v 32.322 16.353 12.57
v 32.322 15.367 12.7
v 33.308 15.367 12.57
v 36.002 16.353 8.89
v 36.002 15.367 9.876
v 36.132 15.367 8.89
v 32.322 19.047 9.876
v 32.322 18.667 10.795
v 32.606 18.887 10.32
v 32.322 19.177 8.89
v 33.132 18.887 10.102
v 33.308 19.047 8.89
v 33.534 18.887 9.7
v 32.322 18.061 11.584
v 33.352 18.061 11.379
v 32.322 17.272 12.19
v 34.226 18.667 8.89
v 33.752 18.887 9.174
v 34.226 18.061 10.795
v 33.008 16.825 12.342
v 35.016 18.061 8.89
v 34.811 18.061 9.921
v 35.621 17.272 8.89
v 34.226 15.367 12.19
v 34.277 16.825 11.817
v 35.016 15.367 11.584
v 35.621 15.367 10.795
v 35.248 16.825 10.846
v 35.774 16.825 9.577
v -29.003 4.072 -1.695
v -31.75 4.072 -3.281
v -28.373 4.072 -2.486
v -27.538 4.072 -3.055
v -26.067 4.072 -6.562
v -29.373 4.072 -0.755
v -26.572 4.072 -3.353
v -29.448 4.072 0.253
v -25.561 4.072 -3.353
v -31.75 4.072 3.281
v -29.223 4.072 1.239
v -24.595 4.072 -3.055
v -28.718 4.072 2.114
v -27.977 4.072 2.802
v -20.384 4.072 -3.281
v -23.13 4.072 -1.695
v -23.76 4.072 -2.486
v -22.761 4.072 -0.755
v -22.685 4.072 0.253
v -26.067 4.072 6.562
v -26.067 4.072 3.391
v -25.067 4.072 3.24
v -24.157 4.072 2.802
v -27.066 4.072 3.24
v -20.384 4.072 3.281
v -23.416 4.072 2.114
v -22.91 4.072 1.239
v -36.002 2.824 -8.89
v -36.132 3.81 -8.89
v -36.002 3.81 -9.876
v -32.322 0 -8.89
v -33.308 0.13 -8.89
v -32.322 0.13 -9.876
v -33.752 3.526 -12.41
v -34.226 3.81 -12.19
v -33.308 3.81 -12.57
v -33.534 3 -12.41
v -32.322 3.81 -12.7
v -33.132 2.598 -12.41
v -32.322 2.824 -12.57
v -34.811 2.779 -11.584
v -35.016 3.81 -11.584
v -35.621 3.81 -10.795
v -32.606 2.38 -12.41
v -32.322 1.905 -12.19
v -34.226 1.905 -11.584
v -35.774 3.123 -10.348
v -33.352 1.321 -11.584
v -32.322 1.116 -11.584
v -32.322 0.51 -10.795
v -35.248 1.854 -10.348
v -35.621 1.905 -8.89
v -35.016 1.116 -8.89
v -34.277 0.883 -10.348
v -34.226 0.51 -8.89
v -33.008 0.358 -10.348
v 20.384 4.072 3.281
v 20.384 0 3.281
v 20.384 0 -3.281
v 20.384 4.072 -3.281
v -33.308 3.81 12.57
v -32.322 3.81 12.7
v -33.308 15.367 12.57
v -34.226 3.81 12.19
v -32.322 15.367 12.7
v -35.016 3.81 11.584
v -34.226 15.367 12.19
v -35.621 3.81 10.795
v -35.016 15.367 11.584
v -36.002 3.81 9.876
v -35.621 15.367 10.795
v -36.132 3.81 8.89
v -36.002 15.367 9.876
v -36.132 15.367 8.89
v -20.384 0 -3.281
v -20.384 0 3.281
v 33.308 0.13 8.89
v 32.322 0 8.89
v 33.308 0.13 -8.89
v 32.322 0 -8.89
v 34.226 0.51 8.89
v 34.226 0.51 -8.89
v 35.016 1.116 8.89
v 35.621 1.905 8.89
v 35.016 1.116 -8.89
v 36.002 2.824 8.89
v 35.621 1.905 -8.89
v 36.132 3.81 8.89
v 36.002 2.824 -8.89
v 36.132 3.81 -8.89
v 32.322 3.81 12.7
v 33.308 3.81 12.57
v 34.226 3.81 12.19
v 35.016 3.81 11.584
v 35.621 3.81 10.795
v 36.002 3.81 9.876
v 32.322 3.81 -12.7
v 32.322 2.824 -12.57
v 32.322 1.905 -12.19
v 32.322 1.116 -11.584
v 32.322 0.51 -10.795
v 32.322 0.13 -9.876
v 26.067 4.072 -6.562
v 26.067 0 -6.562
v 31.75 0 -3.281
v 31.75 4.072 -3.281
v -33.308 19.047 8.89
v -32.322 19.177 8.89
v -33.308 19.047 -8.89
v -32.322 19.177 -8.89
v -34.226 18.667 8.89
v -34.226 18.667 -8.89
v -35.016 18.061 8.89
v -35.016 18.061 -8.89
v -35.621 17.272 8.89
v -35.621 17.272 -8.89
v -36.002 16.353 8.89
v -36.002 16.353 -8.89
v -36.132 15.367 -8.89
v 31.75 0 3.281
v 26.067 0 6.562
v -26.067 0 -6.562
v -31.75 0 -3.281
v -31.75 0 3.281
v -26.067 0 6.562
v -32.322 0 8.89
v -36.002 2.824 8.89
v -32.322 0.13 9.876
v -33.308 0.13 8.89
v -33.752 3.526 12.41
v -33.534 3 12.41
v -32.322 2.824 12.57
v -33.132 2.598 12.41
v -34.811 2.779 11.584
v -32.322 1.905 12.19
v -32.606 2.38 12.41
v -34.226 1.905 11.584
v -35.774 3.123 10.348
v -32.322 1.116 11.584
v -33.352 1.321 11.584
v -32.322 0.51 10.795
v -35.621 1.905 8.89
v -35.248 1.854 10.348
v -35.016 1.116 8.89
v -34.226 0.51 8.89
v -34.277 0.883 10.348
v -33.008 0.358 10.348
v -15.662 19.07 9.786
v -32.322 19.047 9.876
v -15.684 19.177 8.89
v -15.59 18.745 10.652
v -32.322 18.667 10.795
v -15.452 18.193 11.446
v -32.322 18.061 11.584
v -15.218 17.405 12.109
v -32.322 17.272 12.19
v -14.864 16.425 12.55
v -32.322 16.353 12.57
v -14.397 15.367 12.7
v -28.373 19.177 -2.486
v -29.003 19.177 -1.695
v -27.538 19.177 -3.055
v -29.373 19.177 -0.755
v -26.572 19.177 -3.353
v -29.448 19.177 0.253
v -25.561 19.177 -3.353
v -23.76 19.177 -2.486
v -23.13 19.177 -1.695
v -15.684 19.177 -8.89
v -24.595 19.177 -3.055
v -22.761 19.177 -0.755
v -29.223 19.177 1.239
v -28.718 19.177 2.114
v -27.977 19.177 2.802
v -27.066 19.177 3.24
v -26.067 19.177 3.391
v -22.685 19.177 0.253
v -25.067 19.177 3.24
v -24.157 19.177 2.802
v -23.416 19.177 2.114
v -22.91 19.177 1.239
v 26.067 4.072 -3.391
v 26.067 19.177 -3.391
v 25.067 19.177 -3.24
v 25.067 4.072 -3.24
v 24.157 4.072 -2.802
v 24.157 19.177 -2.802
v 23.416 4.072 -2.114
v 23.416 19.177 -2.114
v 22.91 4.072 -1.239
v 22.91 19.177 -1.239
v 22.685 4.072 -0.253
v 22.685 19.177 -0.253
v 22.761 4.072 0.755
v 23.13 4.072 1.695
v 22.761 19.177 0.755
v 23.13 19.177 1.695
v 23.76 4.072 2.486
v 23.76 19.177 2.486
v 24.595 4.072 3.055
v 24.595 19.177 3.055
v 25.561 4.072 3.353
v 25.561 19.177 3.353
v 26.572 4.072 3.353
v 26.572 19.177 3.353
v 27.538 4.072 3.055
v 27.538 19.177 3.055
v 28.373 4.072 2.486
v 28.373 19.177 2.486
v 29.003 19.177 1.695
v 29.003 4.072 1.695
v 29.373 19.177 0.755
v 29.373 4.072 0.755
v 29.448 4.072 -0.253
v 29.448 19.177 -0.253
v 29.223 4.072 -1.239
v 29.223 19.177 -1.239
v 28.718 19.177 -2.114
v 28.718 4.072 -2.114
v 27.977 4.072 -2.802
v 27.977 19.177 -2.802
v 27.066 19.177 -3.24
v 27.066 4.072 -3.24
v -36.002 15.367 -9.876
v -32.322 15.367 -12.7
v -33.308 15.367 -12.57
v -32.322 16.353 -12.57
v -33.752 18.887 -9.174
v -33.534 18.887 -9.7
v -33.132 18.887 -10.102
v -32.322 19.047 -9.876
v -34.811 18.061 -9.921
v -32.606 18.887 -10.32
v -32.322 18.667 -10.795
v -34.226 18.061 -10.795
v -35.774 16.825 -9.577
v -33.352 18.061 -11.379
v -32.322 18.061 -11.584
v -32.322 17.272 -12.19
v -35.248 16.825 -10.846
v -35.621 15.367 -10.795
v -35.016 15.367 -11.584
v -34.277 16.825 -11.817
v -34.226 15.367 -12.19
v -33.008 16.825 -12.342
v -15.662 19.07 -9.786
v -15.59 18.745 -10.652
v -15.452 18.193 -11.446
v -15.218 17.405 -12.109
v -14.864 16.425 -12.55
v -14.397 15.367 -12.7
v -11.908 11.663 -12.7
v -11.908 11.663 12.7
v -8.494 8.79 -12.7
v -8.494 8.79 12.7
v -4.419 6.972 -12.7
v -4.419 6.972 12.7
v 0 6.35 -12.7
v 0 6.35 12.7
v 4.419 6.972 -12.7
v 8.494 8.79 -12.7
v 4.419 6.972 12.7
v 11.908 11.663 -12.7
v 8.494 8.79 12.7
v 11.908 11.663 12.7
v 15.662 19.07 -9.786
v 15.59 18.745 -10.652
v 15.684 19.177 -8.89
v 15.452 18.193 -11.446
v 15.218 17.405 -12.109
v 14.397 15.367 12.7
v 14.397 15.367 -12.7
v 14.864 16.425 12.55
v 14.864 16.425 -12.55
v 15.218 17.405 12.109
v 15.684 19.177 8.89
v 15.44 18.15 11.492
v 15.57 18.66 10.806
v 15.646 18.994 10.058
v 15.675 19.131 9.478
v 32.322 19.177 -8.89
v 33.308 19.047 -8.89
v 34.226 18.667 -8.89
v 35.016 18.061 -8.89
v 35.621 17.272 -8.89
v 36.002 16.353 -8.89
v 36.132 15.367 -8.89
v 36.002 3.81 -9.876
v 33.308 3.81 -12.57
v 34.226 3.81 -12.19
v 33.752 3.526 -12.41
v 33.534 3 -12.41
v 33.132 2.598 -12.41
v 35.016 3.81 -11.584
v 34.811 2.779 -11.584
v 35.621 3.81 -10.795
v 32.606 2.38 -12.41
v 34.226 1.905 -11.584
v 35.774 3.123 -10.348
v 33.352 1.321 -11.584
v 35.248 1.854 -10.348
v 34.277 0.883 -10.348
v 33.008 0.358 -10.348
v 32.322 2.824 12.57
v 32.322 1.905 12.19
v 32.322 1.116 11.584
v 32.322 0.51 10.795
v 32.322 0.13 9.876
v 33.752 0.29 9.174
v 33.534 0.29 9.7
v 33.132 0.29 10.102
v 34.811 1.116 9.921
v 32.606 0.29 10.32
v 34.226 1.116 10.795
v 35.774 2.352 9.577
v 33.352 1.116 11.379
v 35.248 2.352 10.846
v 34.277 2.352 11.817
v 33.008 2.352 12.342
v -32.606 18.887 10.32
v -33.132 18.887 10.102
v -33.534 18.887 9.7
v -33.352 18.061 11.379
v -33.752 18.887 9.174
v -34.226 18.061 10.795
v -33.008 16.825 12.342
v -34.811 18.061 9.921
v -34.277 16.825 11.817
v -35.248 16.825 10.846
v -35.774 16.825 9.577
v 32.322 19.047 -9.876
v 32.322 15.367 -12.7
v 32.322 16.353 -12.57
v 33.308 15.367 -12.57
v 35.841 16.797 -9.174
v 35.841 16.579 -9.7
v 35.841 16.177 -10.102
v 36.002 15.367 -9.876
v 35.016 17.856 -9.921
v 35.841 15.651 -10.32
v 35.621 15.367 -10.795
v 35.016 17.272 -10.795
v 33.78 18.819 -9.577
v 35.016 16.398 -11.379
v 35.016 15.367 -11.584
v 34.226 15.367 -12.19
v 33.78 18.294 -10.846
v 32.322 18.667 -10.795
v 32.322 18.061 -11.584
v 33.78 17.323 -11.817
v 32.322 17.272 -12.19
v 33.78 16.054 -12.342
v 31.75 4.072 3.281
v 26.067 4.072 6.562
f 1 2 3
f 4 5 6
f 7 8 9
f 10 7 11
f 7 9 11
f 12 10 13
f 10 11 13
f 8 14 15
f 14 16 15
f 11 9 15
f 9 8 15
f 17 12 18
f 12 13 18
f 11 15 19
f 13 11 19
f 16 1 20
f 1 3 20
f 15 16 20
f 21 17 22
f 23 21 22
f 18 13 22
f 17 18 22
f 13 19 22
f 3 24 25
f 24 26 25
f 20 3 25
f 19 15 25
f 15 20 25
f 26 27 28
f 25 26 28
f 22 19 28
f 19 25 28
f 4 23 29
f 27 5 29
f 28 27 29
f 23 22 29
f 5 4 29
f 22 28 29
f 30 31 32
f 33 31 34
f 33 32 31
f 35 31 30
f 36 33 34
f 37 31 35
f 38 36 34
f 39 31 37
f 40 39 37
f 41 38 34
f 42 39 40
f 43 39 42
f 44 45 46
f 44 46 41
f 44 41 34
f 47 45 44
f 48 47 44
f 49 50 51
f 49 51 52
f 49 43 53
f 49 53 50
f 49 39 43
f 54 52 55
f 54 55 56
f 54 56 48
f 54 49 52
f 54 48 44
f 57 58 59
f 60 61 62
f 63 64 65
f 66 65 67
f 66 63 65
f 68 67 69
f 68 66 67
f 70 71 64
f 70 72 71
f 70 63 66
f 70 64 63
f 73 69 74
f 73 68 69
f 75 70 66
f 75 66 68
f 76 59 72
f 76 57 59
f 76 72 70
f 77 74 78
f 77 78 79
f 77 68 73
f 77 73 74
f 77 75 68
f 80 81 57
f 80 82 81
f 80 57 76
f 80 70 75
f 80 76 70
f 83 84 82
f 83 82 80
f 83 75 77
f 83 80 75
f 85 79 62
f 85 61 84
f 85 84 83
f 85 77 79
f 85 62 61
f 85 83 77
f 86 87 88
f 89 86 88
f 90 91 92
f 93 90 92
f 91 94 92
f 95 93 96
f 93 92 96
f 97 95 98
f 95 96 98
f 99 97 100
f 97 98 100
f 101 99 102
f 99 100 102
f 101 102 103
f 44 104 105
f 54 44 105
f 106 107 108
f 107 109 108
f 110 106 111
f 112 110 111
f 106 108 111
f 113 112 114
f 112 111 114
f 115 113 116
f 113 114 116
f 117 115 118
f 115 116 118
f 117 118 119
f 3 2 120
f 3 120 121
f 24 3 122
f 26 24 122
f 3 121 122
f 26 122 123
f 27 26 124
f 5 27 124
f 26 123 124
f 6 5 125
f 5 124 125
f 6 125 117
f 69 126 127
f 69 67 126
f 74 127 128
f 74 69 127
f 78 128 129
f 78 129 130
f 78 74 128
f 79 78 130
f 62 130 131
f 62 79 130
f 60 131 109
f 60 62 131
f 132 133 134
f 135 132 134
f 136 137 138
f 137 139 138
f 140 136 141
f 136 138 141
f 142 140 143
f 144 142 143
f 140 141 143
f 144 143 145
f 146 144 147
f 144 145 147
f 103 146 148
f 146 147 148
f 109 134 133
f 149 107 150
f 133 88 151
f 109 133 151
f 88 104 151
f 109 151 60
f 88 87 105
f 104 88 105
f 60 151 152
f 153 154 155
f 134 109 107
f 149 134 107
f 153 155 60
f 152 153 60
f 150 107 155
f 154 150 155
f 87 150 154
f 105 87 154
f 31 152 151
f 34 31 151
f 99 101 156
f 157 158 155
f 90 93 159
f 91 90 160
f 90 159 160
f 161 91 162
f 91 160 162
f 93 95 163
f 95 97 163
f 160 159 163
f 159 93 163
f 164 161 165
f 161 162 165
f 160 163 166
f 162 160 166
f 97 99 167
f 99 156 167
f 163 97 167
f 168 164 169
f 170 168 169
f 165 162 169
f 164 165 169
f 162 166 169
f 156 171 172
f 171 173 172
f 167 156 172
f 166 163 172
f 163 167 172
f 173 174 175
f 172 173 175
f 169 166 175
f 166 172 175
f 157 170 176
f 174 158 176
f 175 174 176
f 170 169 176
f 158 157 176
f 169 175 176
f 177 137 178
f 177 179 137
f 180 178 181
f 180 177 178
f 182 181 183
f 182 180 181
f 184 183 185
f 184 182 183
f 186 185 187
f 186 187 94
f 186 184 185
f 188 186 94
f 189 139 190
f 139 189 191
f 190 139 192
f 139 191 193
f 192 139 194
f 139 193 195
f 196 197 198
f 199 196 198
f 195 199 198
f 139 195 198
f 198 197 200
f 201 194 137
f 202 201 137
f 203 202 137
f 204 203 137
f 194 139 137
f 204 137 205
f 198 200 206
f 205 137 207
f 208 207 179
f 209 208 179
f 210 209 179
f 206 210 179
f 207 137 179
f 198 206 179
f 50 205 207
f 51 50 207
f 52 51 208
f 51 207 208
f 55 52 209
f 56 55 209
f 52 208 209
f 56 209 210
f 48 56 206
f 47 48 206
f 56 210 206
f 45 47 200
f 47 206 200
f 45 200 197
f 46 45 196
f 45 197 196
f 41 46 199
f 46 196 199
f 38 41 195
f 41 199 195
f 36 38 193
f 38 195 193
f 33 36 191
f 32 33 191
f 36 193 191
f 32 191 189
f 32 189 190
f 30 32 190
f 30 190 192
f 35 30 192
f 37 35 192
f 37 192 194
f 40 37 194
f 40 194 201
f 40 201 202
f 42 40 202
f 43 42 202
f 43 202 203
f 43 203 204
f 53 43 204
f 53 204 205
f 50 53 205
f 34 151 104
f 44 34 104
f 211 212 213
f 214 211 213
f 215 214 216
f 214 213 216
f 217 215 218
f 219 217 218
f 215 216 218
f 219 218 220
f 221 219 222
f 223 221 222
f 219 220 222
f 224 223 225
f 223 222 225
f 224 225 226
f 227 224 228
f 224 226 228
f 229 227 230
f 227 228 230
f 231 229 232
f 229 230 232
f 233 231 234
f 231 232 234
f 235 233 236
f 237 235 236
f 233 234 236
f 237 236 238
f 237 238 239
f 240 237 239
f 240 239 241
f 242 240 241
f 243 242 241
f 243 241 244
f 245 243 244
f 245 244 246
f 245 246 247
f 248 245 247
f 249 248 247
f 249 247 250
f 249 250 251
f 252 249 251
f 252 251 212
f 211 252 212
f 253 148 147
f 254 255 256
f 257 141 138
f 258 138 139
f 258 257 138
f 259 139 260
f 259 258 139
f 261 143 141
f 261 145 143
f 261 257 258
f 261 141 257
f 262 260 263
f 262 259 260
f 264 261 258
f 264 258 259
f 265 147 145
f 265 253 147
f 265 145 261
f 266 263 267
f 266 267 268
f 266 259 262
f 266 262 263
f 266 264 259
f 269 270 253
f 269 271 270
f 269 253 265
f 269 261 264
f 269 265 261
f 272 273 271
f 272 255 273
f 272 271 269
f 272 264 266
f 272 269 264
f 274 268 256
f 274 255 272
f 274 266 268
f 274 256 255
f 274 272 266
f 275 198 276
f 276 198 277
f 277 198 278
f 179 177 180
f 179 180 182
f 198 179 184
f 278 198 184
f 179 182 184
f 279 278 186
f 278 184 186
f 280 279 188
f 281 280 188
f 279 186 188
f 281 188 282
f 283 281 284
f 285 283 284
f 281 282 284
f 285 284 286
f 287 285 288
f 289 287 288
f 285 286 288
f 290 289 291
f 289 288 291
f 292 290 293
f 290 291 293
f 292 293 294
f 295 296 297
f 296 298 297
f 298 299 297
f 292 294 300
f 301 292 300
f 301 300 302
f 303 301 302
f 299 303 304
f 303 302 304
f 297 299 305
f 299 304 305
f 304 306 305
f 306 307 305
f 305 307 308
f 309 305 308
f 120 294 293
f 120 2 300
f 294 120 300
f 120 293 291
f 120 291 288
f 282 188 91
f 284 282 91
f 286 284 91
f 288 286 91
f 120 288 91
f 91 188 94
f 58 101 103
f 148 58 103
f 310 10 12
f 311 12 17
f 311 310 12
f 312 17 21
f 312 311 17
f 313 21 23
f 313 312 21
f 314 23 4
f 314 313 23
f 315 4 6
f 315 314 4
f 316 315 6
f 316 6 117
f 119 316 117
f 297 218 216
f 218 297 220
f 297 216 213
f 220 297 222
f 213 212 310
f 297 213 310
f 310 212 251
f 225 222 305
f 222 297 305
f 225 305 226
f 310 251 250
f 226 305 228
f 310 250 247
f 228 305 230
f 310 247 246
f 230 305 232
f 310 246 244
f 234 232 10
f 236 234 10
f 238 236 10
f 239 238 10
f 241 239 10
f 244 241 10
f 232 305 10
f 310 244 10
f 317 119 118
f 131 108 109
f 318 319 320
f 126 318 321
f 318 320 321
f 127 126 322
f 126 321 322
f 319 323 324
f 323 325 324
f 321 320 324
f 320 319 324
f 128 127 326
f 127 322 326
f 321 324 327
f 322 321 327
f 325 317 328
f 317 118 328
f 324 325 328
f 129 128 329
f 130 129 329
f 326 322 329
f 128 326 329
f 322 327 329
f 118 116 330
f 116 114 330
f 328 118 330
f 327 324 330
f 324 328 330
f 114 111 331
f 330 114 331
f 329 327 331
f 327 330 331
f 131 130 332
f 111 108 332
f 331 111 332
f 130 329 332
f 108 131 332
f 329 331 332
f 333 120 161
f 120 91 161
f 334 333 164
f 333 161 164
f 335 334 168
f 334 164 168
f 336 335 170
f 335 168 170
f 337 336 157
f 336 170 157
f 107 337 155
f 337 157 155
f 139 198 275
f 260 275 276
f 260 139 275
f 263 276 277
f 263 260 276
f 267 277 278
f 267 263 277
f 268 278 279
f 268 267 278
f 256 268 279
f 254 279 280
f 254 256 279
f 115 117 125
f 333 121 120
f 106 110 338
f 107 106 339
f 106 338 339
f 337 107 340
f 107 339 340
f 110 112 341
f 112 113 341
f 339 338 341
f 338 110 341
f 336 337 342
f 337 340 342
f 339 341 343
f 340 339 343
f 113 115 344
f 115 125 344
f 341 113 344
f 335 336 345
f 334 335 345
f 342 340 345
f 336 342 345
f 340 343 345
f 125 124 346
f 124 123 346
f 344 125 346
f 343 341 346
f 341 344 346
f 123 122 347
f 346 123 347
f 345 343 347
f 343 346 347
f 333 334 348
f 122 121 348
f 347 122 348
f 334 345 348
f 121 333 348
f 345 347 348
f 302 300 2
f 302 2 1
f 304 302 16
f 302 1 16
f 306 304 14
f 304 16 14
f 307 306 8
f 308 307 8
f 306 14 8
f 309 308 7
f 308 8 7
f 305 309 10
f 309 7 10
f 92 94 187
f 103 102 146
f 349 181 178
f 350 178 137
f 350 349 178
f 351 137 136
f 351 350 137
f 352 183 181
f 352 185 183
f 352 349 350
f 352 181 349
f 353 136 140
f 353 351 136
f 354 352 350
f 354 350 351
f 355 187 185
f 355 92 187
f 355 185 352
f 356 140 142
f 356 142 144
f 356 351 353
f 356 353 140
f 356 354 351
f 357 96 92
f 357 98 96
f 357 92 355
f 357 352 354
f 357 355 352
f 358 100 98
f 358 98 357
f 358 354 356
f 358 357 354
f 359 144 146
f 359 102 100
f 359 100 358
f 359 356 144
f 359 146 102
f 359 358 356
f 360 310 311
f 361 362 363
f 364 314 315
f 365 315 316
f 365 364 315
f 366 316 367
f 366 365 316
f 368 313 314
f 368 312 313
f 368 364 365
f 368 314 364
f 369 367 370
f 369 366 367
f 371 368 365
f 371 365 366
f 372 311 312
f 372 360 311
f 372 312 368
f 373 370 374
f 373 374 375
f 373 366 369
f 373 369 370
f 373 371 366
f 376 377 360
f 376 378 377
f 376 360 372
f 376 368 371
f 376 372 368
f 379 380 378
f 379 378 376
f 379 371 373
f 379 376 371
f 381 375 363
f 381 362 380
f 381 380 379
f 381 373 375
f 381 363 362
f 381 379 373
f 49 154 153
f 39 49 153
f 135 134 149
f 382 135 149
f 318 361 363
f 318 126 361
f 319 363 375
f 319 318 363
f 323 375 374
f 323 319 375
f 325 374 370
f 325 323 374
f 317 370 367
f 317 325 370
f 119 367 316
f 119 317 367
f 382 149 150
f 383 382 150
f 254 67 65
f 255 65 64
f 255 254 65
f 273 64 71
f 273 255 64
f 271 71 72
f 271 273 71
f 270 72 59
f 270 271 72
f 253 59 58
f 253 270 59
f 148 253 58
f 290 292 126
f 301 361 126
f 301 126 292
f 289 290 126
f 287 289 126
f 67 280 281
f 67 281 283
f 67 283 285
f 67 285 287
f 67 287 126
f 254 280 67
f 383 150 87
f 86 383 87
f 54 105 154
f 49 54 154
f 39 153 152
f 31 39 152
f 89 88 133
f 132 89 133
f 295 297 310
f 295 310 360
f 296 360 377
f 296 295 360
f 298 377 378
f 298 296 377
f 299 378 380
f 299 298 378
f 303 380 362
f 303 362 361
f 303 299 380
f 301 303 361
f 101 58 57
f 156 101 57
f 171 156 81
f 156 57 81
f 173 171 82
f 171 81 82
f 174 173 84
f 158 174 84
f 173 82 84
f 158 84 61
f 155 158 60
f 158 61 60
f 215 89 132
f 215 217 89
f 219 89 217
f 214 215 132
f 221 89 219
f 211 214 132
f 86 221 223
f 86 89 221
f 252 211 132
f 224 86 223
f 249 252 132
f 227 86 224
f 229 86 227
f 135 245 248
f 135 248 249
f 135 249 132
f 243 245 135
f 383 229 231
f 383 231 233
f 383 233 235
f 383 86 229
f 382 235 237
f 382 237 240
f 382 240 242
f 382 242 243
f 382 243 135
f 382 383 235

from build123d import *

# Parameters (mm, degrees)
BOSS_EXTRUDE1_DEPTH = 12.7
SKETCH2_R           = 3.3909
CUT_EXTRUDE1_DEPTH  = 45.343964598
SKETCH3_W           = 72.263
SKETCH3_H           = 7.175826556
CUT_EXTRUDE2_DEPTH  = 50.500072689
CUT_EXTRUDE3_DEPTH  = 4.07162
FILLET3_R           = 3.81


with BuildPart() as part:
    # Sketch1 → Boss-Extrude1 (new, symmetric)
    with BuildSketch(Plane.XY):
        with BuildLine():
            Line((16.002, 22.352), (36.1315, 22.352))
            Line((36.1315, 22.352), (36.1315, 0))
            Line((36.1315, 0), (-36.1315, 0))
            Line((-36.1315, 0), (-36.1315, 22.352))
            Line((-36.1315, 22.352), (-16.002, 22.352))
            ThreePointArc((-16.002, 22.352), (0, 6.35), (16.002, 22.352))
        make_face()
    extrude(amount=BOSS_EXTRUDE1_DEPTH, both=True)

    # Sketch2 → Cut-Extrude1 (cut, through all)
    with BuildSketch(Plane(origin=(0, 22.352, 0), x_dir=(1, 0, 0), z_dir=(0, 1, 0))):
        with Locations(Location((-26.06675, 0, 0), (0, 0, 270))):
            Circle(SKETCH2_R)
        with Locations(Location((26.06675, 0, 0), (0, 0, 90))):
            Circle(SKETCH2_R)
    extrude(amount=-CUT_EXTRUDE1_DEPTH, mode=Mode.SUBTRACT)

    # Sketch3 → Cut-Extrude2 (cut, through all)
    with BuildSketch(Plane.XY.offset(12.7)):
        with Locations((0, 22.764913278)):
            Rectangle(SKETCH3_W, SKETCH3_H)
    extrude(amount=-CUT_EXTRUDE2_DEPTH, mode=Mode.SUBTRACT)

    # Sketch6 → Cut-Extrude3 (cut)
    with BuildSketch(Plane.XZ):
        Polygon((-26.06675, -6.562451835), (-20.3835, -3.281225917), (-20.3835, 3.281225917), (-26.06675, 6.562451835), (-31.75, 3.281225917), (-31.75, -3.281225917), align=None)
        Polygon((26.06675, 6.562451835), (20.3835, 3.281225917), (20.3835, -3.281225917), (26.06675, -6.562451835), (31.75, -3.281225917), (31.75, 3.281225917), align=None)
    extrude(amount=-CUT_EXTRUDE3_DEPTH, mode=Mode.SUBTRACT)

    # Fillet3
    fillet3_edges = [part.edges().sort_by_distance(p)[0] for p in [
        (36.1315, 9.5885, 12.7),
        (36.1315, 0, 0),
        (-36.1315, 0, 0),
        (-36.1315, 9.5885, -12.7),
        (-36.1315, 9.5885, 12.7),
        (25.907678637, 19.177, 12.7),
        (-25.907678637, 19.177, 12.7),
        (-36.1315, 19.177, 0),
        (-25.907678637, 19.177, -12.7),
        (25.907678637, 19.177, -12.7),
        (36.1315, 19.177, 0),
        (0, 0, 12.7),
        (36.1315, 9.5885, -12.7),
        (0, 0, -12.7),
    ]]
    fillet(fillet3_edges, radius=FILLET3_R)


solid = part.part
